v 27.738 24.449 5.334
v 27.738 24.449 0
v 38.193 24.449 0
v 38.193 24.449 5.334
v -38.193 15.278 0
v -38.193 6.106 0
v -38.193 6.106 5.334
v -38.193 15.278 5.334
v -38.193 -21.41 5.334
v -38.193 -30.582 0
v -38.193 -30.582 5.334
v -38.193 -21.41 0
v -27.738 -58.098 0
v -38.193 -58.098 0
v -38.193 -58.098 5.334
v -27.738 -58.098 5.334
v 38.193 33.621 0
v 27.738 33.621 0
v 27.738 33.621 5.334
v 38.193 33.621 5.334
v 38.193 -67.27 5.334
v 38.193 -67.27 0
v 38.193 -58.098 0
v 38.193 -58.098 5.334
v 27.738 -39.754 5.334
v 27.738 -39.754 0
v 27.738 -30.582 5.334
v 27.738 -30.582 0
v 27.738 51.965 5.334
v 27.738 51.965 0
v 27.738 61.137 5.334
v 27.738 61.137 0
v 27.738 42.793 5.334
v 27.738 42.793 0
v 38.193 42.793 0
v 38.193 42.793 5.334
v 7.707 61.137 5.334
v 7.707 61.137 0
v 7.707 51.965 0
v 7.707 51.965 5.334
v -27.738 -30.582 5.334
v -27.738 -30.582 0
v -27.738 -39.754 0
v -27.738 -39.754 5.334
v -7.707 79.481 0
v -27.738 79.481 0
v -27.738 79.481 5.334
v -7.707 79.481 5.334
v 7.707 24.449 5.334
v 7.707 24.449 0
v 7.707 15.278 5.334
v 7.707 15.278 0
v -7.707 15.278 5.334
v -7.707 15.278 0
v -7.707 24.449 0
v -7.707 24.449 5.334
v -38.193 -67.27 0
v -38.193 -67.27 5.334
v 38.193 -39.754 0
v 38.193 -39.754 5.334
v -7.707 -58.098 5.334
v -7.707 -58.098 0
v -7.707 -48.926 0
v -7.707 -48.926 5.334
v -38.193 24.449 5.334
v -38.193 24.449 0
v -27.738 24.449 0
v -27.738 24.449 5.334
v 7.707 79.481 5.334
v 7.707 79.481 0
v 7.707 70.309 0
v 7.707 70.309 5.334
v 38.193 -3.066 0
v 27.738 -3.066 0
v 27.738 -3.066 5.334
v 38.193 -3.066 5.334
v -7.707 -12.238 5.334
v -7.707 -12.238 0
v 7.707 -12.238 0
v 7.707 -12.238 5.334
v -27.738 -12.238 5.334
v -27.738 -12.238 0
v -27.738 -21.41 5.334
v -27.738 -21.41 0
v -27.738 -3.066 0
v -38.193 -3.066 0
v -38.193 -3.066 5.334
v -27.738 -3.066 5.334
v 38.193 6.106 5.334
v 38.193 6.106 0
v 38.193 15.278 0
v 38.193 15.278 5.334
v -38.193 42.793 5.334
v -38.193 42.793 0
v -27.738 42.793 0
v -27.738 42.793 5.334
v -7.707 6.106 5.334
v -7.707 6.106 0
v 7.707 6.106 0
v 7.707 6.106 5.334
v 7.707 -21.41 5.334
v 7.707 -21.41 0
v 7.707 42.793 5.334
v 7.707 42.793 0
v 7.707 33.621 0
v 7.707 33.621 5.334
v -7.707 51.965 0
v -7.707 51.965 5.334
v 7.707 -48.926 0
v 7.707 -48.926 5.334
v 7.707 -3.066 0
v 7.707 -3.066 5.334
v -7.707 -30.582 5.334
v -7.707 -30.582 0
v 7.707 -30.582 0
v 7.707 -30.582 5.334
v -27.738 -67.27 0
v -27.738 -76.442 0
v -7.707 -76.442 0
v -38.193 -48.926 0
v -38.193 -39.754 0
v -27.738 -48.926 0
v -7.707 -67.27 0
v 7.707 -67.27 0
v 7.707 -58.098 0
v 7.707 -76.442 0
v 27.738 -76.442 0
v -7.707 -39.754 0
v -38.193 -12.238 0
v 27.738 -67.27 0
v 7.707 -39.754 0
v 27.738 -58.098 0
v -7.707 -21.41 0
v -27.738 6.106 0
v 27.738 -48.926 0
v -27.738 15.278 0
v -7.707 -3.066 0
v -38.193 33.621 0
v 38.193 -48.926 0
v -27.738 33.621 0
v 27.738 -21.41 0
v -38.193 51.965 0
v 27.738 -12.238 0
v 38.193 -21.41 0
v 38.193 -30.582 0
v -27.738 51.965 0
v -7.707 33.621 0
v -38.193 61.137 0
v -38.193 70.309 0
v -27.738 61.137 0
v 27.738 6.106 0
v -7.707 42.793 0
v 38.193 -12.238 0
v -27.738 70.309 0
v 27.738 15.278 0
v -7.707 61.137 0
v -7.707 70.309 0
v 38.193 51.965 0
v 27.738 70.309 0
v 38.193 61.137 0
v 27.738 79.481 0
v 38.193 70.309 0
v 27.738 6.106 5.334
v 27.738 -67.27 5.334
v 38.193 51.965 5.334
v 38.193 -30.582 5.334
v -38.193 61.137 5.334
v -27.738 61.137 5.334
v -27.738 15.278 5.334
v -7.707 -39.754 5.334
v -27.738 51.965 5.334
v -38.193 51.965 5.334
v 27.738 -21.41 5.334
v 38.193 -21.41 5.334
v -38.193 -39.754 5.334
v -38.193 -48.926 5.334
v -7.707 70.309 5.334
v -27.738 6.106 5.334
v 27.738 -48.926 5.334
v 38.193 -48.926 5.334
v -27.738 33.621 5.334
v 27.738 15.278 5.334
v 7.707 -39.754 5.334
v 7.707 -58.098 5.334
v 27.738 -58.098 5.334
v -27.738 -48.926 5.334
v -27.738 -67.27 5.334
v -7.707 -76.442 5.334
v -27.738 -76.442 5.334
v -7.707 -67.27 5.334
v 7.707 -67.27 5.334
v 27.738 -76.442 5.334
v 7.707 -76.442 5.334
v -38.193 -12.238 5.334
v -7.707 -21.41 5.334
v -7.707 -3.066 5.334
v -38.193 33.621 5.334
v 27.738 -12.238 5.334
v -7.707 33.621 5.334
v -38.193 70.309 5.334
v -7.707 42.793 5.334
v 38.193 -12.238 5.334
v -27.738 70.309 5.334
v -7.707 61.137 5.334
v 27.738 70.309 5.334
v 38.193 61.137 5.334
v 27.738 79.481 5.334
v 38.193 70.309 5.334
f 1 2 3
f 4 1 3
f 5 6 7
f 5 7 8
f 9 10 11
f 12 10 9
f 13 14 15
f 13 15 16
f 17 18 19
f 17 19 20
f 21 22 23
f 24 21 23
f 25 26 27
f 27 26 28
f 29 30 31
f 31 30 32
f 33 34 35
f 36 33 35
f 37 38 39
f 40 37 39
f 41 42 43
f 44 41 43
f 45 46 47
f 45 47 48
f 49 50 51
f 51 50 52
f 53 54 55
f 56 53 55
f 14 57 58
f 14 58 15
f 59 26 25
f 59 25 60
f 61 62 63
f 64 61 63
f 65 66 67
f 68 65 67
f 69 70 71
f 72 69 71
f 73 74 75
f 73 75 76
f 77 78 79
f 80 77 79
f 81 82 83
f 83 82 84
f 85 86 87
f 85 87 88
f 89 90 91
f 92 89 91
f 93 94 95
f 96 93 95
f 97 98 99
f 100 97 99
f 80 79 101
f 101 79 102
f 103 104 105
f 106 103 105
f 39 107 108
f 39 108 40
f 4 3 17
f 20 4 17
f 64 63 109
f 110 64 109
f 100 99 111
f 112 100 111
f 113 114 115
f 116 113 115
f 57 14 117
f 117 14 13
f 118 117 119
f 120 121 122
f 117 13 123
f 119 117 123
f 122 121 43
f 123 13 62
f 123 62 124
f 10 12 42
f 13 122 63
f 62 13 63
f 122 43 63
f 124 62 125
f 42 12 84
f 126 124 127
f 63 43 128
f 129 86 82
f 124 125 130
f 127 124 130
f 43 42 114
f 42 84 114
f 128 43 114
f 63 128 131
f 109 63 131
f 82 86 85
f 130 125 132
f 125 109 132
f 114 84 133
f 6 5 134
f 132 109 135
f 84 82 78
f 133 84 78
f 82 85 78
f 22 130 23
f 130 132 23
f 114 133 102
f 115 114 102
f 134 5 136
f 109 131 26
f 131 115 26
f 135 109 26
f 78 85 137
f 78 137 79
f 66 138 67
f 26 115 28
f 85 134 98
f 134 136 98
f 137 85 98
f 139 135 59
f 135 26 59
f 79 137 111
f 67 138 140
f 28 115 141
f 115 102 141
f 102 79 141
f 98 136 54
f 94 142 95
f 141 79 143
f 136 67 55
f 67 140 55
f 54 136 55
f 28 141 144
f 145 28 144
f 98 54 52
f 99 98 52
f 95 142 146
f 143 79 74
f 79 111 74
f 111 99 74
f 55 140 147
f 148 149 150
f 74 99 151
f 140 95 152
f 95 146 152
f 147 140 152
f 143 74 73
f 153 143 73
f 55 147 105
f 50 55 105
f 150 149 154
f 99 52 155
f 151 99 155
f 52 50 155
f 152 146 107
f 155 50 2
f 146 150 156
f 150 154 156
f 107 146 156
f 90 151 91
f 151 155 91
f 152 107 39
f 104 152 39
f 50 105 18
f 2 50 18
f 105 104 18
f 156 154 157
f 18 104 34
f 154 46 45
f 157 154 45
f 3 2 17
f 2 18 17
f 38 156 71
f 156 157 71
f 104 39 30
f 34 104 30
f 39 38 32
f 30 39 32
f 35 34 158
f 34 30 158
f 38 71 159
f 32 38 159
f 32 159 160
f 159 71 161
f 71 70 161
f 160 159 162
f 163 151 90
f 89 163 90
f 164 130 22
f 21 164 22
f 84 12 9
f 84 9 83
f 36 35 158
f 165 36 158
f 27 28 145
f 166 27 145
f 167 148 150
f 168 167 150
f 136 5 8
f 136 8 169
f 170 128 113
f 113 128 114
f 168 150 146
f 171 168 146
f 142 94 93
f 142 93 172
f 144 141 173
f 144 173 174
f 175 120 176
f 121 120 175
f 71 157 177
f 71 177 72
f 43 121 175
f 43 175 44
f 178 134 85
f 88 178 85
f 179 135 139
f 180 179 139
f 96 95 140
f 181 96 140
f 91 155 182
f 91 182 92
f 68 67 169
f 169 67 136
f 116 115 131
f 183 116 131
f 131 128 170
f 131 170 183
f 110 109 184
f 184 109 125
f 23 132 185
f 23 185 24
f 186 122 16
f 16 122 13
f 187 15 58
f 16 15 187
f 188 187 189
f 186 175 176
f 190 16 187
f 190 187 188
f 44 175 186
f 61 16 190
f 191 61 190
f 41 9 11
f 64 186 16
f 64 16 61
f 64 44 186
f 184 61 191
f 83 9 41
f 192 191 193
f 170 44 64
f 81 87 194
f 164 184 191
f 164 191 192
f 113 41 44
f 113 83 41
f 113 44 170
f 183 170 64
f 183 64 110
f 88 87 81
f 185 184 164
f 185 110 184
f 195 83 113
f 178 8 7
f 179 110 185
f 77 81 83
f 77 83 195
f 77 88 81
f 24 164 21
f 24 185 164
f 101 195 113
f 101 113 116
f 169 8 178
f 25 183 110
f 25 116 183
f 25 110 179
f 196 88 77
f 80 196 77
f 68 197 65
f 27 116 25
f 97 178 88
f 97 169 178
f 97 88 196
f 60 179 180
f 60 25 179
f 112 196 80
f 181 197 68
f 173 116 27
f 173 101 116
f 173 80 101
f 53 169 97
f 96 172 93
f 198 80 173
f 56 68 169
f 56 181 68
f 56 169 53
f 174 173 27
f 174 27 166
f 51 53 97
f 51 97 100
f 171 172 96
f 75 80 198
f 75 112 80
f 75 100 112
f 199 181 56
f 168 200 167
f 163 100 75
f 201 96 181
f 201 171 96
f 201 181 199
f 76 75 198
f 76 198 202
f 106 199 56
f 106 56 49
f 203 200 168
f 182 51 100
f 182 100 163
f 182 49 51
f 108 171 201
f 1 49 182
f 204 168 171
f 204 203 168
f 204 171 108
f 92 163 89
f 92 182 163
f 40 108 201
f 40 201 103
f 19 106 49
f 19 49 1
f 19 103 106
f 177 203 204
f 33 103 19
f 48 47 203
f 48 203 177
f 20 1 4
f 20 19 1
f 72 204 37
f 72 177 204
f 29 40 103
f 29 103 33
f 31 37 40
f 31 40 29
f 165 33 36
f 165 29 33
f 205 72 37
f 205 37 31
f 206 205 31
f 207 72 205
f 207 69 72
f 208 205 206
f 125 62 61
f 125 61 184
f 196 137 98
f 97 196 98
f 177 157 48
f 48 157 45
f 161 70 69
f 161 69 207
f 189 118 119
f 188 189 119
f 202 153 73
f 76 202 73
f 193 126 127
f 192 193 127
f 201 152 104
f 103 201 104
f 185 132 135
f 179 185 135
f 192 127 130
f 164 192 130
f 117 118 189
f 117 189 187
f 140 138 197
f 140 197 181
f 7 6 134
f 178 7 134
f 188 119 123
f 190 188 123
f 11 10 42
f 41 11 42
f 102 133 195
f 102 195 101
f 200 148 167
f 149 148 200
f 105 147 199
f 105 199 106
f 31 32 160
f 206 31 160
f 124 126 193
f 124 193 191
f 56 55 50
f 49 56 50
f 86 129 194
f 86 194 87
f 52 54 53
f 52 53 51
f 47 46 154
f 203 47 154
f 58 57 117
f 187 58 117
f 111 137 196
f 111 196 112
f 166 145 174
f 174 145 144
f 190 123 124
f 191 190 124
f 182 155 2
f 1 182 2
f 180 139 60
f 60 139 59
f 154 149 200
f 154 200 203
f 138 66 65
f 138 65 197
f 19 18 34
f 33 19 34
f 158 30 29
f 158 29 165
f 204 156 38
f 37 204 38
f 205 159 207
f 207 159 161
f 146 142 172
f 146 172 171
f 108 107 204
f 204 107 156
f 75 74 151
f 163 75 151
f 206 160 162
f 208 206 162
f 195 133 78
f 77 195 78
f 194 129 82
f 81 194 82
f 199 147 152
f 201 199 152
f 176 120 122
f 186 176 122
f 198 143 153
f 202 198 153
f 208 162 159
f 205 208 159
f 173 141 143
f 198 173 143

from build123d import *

# Parameters (mm, degrees)
F0_W     = 20.0313134119
F0_H     = 9.17194
F0_H_2   = 9.1719370473
F0_H_3   = 9.1719407726
F0_H_4   = 9.1719385237
F0_H_5   = 9.1719403863
F0_H_6   = 9.1719399947
F0_H_7   = 9.1719411589
F0_H_8   = 9.1719400741
F0_W_2   = 20.0313036
F0_W_3   = 15.4139306396
F0_W_4   = 10.4550179094
F0_W_5   = 10.4550202707
F0_W_6   = 10.455021
F1_DEPTH = 5.334


# Not quite as in the source:
# - ends of sketch curves that miss each other by under 0.0002 mm in the source are joined


with BuildPart() as f1:
    # F0 (on Top) → F1 (new body)
    with BuildSketch(Plane.XY):
        with Locations((-17.7226220258, 74.8951544916)):
            Rectangle(F0_W, F0_H)
        with Locations((-17.7226220258, 65.723215968)):
            Rectangle(F0_W, F0_H_2)
        with Locations((-17.7226220258, 47.3793366717)):
            Rectangle(F0_W, F0_H)
        with Locations((-17.7226220258, 56.551277058)):
            Rectangle(F0_W, F0_H_3)
        with Locations((-17.7226220258, 38.2073974099)):
            Rectangle(F0_W, F0_H_4)
        with Locations((-17.7226220258, 29.0354579549)):
            Rectangle(F0_W, F0_H_5)
        with Locations((-17.7226220258, -16.824242307)):
            Rectangle(F0_W, F0_H)
        with Locations((-17.7226220258, 1.5196376903)):
            Rectangle(F0_W, F0_H_6)
        with Locations((-17.7226220258, -35.1681232728)):
            Rectangle(F0_W, F0_H_7)
        with Locations((-17.7226220258, 10.6915776877)):
            Rectangle(F0_W, F0_H)
        with Locations((-17.7226220258, -7.652302307)):
            Rectangle(F0_W, F0_H)
        with Locations((-17.7226220258, -53.5120038522)):
            Rectangle(F0_W, F0_H)
        with Locations((-17.7226220258, -25.9961825002)):
            Rectangle(F0_W, F0_H_5)
        with Locations((-17.7226220258, -44.3400638522)):
            Rectangle(F0_W, F0_H)
        with Locations((-17.7226220258, -62.6839438522)):
            Rectangle(F0_W, F0_H)
        with Locations((-17.7226220258, 19.8635177247)):
            Rectangle(F0_W, F0_H_8)
        with Locations((17.7226171198, 29.0354579549)):
            Rectangle(F0_W_2, F0_H_5)
        with Locations((17.7226171198, 47.3793366717)):
            Rectangle(F0_W_2, F0_H)
        with Locations((17.7226171198, -62.6839438522)):
            Rectangle(F0_W_2, F0_H)
        with Locations((17.7226171198, 19.8635177247)):
            Rectangle(F0_W_2, F0_H_8)
        with Locations((17.7226171198, -53.5120038522)):
            Rectangle(F0_W_2, F0_H)
        with Locations((17.7226171198, -25.9961825002)):
            Rectangle(F0_W_2, F0_H_5)
        with Locations((17.7226171198, -7.652302307)):
            Rectangle(F0_W_2, F0_H)
        with Locations((17.7226171198, 38.2073974099)):
            Rectangle(F0_W_2, F0_H_4)
        with Locations((17.7226171198, -35.1681232728)):
            Rectangle(F0_W_2, F0_H_7)
        with Locations((17.7226171198, 10.6915776877)):
            Rectangle(F0_W_2, F0_H)
        with Locations((17.7226171198, -44.3400638522)):
            Rectangle(F0_W_2, F0_H)
        with Locations((17.7226171198, 65.723215968)):
            Rectangle(F0_W_2, F0_H_2)
        with Locations((17.7226171198, 74.8951544916)):
            Rectangle(F0_W_2, F0_H)
        with Locations((17.7226171198, 56.551277058)):
            Rectangle(F0_W_2, F0_H_3)
        with Locations((17.7226171198, -16.824242307)):
            Rectangle(F0_W_2, F0_H)
        with Locations((17.7226171198, 1.5196376903)):
            Rectangle(F0_W_2, F0_H_6)
        Polygon((27.7382689198, 70.3091844916), (27.7382689198, 61.1372474443), (38.1932891905, 61.1372474443), (38.1932891905, 70.3091878306), align=None)
        with Locations((0, 65.723215968)):
            Rectangle(F0_W_3, F0_H_2)
        with Locations((-32.9657876864, 65.723215968)):
            Rectangle(F0_W_4, F0_H_2)
        with Locations((-32.9657876864, 47.3793366717)):
            Rectangle(F0_W_4, F0_H)
        with Locations((0, 47.3793366717)):
            Rectangle(F0_W_3, F0_H)
        with Locations((32.9657790552, 47.3793366717)):
            Rectangle(F0_W_5, F0_H)
        with Locations((32.9657790552, 29.0354579549)):
            Rectangle(F0_W_5, F0_H_5)
        with Locations((0, 29.0354579549)):
            Rectangle(F0_W_3, F0_H_5)
        with Locations((-32.9657876864, 29.0354579549)):
            Rectangle(F0_W_4, F0_H_5)
        with Locations((-32.9657876864, 10.6915776877)):
            Rectangle(F0_W_4, F0_H)
        with Locations((32.9657790552, 10.6915776877)):
            Rectangle(F0_W_5, F0_H)
        with Locations((32.9657790552, -7.652302307)):
            Rectangle(F0_W_5, F0_H)
        with Locations((-32.9657876864, -7.652302307)):
            Rectangle(F0_W_4, F0_H)
        with Locations((-32.9657876864, -25.9961825002)):
            Rectangle(F0_W_4, F0_H_5)
        with Locations((0, 10.6915776877)):
            Rectangle(F0_W_3, F0_H)
        with Locations((0, -7.652302307)):
            Rectangle(F0_W_3, F0_H)
        with Locations((0, -25.9961825002)):
            Rectangle(F0_W_3, F0_H_5)
        with Locations((0, -44.3400638522)):
            Rectangle(F0_W_3, F0_H)
        with Locations((32.9657794198, -25.9961825002)):
            Rectangle(F0_W_6, F0_H_5)
        with Locations((32.9657794198, -44.3400638522)):
            Rectangle(F0_W_6, F0_H)
        with Locations((-32.9657876864, -44.3400638522)):
            Rectangle(F0_W_4, F0_H)
        with Locations((-32.9657876864, -62.6839438522)):
            Rectangle(F0_W_4, F0_H)
        with Locations((0, -62.6839438522)):
            Rectangle(F0_W_3, F0_H)
        with Locations((32.9657794198, -62.6839438522)):
            Rectangle(F0_W_6, F0_H)
        with Locations((-17.7226220258, -71.8558840454)):
            Rectangle(F0_W, F0_H_5)
        with Locations((17.7226171198, -71.8558840454)):
            Rectangle(F0_W_2, F0_H_5)
    extrude(amount=F1_DEPTH)


solid = f1.part
